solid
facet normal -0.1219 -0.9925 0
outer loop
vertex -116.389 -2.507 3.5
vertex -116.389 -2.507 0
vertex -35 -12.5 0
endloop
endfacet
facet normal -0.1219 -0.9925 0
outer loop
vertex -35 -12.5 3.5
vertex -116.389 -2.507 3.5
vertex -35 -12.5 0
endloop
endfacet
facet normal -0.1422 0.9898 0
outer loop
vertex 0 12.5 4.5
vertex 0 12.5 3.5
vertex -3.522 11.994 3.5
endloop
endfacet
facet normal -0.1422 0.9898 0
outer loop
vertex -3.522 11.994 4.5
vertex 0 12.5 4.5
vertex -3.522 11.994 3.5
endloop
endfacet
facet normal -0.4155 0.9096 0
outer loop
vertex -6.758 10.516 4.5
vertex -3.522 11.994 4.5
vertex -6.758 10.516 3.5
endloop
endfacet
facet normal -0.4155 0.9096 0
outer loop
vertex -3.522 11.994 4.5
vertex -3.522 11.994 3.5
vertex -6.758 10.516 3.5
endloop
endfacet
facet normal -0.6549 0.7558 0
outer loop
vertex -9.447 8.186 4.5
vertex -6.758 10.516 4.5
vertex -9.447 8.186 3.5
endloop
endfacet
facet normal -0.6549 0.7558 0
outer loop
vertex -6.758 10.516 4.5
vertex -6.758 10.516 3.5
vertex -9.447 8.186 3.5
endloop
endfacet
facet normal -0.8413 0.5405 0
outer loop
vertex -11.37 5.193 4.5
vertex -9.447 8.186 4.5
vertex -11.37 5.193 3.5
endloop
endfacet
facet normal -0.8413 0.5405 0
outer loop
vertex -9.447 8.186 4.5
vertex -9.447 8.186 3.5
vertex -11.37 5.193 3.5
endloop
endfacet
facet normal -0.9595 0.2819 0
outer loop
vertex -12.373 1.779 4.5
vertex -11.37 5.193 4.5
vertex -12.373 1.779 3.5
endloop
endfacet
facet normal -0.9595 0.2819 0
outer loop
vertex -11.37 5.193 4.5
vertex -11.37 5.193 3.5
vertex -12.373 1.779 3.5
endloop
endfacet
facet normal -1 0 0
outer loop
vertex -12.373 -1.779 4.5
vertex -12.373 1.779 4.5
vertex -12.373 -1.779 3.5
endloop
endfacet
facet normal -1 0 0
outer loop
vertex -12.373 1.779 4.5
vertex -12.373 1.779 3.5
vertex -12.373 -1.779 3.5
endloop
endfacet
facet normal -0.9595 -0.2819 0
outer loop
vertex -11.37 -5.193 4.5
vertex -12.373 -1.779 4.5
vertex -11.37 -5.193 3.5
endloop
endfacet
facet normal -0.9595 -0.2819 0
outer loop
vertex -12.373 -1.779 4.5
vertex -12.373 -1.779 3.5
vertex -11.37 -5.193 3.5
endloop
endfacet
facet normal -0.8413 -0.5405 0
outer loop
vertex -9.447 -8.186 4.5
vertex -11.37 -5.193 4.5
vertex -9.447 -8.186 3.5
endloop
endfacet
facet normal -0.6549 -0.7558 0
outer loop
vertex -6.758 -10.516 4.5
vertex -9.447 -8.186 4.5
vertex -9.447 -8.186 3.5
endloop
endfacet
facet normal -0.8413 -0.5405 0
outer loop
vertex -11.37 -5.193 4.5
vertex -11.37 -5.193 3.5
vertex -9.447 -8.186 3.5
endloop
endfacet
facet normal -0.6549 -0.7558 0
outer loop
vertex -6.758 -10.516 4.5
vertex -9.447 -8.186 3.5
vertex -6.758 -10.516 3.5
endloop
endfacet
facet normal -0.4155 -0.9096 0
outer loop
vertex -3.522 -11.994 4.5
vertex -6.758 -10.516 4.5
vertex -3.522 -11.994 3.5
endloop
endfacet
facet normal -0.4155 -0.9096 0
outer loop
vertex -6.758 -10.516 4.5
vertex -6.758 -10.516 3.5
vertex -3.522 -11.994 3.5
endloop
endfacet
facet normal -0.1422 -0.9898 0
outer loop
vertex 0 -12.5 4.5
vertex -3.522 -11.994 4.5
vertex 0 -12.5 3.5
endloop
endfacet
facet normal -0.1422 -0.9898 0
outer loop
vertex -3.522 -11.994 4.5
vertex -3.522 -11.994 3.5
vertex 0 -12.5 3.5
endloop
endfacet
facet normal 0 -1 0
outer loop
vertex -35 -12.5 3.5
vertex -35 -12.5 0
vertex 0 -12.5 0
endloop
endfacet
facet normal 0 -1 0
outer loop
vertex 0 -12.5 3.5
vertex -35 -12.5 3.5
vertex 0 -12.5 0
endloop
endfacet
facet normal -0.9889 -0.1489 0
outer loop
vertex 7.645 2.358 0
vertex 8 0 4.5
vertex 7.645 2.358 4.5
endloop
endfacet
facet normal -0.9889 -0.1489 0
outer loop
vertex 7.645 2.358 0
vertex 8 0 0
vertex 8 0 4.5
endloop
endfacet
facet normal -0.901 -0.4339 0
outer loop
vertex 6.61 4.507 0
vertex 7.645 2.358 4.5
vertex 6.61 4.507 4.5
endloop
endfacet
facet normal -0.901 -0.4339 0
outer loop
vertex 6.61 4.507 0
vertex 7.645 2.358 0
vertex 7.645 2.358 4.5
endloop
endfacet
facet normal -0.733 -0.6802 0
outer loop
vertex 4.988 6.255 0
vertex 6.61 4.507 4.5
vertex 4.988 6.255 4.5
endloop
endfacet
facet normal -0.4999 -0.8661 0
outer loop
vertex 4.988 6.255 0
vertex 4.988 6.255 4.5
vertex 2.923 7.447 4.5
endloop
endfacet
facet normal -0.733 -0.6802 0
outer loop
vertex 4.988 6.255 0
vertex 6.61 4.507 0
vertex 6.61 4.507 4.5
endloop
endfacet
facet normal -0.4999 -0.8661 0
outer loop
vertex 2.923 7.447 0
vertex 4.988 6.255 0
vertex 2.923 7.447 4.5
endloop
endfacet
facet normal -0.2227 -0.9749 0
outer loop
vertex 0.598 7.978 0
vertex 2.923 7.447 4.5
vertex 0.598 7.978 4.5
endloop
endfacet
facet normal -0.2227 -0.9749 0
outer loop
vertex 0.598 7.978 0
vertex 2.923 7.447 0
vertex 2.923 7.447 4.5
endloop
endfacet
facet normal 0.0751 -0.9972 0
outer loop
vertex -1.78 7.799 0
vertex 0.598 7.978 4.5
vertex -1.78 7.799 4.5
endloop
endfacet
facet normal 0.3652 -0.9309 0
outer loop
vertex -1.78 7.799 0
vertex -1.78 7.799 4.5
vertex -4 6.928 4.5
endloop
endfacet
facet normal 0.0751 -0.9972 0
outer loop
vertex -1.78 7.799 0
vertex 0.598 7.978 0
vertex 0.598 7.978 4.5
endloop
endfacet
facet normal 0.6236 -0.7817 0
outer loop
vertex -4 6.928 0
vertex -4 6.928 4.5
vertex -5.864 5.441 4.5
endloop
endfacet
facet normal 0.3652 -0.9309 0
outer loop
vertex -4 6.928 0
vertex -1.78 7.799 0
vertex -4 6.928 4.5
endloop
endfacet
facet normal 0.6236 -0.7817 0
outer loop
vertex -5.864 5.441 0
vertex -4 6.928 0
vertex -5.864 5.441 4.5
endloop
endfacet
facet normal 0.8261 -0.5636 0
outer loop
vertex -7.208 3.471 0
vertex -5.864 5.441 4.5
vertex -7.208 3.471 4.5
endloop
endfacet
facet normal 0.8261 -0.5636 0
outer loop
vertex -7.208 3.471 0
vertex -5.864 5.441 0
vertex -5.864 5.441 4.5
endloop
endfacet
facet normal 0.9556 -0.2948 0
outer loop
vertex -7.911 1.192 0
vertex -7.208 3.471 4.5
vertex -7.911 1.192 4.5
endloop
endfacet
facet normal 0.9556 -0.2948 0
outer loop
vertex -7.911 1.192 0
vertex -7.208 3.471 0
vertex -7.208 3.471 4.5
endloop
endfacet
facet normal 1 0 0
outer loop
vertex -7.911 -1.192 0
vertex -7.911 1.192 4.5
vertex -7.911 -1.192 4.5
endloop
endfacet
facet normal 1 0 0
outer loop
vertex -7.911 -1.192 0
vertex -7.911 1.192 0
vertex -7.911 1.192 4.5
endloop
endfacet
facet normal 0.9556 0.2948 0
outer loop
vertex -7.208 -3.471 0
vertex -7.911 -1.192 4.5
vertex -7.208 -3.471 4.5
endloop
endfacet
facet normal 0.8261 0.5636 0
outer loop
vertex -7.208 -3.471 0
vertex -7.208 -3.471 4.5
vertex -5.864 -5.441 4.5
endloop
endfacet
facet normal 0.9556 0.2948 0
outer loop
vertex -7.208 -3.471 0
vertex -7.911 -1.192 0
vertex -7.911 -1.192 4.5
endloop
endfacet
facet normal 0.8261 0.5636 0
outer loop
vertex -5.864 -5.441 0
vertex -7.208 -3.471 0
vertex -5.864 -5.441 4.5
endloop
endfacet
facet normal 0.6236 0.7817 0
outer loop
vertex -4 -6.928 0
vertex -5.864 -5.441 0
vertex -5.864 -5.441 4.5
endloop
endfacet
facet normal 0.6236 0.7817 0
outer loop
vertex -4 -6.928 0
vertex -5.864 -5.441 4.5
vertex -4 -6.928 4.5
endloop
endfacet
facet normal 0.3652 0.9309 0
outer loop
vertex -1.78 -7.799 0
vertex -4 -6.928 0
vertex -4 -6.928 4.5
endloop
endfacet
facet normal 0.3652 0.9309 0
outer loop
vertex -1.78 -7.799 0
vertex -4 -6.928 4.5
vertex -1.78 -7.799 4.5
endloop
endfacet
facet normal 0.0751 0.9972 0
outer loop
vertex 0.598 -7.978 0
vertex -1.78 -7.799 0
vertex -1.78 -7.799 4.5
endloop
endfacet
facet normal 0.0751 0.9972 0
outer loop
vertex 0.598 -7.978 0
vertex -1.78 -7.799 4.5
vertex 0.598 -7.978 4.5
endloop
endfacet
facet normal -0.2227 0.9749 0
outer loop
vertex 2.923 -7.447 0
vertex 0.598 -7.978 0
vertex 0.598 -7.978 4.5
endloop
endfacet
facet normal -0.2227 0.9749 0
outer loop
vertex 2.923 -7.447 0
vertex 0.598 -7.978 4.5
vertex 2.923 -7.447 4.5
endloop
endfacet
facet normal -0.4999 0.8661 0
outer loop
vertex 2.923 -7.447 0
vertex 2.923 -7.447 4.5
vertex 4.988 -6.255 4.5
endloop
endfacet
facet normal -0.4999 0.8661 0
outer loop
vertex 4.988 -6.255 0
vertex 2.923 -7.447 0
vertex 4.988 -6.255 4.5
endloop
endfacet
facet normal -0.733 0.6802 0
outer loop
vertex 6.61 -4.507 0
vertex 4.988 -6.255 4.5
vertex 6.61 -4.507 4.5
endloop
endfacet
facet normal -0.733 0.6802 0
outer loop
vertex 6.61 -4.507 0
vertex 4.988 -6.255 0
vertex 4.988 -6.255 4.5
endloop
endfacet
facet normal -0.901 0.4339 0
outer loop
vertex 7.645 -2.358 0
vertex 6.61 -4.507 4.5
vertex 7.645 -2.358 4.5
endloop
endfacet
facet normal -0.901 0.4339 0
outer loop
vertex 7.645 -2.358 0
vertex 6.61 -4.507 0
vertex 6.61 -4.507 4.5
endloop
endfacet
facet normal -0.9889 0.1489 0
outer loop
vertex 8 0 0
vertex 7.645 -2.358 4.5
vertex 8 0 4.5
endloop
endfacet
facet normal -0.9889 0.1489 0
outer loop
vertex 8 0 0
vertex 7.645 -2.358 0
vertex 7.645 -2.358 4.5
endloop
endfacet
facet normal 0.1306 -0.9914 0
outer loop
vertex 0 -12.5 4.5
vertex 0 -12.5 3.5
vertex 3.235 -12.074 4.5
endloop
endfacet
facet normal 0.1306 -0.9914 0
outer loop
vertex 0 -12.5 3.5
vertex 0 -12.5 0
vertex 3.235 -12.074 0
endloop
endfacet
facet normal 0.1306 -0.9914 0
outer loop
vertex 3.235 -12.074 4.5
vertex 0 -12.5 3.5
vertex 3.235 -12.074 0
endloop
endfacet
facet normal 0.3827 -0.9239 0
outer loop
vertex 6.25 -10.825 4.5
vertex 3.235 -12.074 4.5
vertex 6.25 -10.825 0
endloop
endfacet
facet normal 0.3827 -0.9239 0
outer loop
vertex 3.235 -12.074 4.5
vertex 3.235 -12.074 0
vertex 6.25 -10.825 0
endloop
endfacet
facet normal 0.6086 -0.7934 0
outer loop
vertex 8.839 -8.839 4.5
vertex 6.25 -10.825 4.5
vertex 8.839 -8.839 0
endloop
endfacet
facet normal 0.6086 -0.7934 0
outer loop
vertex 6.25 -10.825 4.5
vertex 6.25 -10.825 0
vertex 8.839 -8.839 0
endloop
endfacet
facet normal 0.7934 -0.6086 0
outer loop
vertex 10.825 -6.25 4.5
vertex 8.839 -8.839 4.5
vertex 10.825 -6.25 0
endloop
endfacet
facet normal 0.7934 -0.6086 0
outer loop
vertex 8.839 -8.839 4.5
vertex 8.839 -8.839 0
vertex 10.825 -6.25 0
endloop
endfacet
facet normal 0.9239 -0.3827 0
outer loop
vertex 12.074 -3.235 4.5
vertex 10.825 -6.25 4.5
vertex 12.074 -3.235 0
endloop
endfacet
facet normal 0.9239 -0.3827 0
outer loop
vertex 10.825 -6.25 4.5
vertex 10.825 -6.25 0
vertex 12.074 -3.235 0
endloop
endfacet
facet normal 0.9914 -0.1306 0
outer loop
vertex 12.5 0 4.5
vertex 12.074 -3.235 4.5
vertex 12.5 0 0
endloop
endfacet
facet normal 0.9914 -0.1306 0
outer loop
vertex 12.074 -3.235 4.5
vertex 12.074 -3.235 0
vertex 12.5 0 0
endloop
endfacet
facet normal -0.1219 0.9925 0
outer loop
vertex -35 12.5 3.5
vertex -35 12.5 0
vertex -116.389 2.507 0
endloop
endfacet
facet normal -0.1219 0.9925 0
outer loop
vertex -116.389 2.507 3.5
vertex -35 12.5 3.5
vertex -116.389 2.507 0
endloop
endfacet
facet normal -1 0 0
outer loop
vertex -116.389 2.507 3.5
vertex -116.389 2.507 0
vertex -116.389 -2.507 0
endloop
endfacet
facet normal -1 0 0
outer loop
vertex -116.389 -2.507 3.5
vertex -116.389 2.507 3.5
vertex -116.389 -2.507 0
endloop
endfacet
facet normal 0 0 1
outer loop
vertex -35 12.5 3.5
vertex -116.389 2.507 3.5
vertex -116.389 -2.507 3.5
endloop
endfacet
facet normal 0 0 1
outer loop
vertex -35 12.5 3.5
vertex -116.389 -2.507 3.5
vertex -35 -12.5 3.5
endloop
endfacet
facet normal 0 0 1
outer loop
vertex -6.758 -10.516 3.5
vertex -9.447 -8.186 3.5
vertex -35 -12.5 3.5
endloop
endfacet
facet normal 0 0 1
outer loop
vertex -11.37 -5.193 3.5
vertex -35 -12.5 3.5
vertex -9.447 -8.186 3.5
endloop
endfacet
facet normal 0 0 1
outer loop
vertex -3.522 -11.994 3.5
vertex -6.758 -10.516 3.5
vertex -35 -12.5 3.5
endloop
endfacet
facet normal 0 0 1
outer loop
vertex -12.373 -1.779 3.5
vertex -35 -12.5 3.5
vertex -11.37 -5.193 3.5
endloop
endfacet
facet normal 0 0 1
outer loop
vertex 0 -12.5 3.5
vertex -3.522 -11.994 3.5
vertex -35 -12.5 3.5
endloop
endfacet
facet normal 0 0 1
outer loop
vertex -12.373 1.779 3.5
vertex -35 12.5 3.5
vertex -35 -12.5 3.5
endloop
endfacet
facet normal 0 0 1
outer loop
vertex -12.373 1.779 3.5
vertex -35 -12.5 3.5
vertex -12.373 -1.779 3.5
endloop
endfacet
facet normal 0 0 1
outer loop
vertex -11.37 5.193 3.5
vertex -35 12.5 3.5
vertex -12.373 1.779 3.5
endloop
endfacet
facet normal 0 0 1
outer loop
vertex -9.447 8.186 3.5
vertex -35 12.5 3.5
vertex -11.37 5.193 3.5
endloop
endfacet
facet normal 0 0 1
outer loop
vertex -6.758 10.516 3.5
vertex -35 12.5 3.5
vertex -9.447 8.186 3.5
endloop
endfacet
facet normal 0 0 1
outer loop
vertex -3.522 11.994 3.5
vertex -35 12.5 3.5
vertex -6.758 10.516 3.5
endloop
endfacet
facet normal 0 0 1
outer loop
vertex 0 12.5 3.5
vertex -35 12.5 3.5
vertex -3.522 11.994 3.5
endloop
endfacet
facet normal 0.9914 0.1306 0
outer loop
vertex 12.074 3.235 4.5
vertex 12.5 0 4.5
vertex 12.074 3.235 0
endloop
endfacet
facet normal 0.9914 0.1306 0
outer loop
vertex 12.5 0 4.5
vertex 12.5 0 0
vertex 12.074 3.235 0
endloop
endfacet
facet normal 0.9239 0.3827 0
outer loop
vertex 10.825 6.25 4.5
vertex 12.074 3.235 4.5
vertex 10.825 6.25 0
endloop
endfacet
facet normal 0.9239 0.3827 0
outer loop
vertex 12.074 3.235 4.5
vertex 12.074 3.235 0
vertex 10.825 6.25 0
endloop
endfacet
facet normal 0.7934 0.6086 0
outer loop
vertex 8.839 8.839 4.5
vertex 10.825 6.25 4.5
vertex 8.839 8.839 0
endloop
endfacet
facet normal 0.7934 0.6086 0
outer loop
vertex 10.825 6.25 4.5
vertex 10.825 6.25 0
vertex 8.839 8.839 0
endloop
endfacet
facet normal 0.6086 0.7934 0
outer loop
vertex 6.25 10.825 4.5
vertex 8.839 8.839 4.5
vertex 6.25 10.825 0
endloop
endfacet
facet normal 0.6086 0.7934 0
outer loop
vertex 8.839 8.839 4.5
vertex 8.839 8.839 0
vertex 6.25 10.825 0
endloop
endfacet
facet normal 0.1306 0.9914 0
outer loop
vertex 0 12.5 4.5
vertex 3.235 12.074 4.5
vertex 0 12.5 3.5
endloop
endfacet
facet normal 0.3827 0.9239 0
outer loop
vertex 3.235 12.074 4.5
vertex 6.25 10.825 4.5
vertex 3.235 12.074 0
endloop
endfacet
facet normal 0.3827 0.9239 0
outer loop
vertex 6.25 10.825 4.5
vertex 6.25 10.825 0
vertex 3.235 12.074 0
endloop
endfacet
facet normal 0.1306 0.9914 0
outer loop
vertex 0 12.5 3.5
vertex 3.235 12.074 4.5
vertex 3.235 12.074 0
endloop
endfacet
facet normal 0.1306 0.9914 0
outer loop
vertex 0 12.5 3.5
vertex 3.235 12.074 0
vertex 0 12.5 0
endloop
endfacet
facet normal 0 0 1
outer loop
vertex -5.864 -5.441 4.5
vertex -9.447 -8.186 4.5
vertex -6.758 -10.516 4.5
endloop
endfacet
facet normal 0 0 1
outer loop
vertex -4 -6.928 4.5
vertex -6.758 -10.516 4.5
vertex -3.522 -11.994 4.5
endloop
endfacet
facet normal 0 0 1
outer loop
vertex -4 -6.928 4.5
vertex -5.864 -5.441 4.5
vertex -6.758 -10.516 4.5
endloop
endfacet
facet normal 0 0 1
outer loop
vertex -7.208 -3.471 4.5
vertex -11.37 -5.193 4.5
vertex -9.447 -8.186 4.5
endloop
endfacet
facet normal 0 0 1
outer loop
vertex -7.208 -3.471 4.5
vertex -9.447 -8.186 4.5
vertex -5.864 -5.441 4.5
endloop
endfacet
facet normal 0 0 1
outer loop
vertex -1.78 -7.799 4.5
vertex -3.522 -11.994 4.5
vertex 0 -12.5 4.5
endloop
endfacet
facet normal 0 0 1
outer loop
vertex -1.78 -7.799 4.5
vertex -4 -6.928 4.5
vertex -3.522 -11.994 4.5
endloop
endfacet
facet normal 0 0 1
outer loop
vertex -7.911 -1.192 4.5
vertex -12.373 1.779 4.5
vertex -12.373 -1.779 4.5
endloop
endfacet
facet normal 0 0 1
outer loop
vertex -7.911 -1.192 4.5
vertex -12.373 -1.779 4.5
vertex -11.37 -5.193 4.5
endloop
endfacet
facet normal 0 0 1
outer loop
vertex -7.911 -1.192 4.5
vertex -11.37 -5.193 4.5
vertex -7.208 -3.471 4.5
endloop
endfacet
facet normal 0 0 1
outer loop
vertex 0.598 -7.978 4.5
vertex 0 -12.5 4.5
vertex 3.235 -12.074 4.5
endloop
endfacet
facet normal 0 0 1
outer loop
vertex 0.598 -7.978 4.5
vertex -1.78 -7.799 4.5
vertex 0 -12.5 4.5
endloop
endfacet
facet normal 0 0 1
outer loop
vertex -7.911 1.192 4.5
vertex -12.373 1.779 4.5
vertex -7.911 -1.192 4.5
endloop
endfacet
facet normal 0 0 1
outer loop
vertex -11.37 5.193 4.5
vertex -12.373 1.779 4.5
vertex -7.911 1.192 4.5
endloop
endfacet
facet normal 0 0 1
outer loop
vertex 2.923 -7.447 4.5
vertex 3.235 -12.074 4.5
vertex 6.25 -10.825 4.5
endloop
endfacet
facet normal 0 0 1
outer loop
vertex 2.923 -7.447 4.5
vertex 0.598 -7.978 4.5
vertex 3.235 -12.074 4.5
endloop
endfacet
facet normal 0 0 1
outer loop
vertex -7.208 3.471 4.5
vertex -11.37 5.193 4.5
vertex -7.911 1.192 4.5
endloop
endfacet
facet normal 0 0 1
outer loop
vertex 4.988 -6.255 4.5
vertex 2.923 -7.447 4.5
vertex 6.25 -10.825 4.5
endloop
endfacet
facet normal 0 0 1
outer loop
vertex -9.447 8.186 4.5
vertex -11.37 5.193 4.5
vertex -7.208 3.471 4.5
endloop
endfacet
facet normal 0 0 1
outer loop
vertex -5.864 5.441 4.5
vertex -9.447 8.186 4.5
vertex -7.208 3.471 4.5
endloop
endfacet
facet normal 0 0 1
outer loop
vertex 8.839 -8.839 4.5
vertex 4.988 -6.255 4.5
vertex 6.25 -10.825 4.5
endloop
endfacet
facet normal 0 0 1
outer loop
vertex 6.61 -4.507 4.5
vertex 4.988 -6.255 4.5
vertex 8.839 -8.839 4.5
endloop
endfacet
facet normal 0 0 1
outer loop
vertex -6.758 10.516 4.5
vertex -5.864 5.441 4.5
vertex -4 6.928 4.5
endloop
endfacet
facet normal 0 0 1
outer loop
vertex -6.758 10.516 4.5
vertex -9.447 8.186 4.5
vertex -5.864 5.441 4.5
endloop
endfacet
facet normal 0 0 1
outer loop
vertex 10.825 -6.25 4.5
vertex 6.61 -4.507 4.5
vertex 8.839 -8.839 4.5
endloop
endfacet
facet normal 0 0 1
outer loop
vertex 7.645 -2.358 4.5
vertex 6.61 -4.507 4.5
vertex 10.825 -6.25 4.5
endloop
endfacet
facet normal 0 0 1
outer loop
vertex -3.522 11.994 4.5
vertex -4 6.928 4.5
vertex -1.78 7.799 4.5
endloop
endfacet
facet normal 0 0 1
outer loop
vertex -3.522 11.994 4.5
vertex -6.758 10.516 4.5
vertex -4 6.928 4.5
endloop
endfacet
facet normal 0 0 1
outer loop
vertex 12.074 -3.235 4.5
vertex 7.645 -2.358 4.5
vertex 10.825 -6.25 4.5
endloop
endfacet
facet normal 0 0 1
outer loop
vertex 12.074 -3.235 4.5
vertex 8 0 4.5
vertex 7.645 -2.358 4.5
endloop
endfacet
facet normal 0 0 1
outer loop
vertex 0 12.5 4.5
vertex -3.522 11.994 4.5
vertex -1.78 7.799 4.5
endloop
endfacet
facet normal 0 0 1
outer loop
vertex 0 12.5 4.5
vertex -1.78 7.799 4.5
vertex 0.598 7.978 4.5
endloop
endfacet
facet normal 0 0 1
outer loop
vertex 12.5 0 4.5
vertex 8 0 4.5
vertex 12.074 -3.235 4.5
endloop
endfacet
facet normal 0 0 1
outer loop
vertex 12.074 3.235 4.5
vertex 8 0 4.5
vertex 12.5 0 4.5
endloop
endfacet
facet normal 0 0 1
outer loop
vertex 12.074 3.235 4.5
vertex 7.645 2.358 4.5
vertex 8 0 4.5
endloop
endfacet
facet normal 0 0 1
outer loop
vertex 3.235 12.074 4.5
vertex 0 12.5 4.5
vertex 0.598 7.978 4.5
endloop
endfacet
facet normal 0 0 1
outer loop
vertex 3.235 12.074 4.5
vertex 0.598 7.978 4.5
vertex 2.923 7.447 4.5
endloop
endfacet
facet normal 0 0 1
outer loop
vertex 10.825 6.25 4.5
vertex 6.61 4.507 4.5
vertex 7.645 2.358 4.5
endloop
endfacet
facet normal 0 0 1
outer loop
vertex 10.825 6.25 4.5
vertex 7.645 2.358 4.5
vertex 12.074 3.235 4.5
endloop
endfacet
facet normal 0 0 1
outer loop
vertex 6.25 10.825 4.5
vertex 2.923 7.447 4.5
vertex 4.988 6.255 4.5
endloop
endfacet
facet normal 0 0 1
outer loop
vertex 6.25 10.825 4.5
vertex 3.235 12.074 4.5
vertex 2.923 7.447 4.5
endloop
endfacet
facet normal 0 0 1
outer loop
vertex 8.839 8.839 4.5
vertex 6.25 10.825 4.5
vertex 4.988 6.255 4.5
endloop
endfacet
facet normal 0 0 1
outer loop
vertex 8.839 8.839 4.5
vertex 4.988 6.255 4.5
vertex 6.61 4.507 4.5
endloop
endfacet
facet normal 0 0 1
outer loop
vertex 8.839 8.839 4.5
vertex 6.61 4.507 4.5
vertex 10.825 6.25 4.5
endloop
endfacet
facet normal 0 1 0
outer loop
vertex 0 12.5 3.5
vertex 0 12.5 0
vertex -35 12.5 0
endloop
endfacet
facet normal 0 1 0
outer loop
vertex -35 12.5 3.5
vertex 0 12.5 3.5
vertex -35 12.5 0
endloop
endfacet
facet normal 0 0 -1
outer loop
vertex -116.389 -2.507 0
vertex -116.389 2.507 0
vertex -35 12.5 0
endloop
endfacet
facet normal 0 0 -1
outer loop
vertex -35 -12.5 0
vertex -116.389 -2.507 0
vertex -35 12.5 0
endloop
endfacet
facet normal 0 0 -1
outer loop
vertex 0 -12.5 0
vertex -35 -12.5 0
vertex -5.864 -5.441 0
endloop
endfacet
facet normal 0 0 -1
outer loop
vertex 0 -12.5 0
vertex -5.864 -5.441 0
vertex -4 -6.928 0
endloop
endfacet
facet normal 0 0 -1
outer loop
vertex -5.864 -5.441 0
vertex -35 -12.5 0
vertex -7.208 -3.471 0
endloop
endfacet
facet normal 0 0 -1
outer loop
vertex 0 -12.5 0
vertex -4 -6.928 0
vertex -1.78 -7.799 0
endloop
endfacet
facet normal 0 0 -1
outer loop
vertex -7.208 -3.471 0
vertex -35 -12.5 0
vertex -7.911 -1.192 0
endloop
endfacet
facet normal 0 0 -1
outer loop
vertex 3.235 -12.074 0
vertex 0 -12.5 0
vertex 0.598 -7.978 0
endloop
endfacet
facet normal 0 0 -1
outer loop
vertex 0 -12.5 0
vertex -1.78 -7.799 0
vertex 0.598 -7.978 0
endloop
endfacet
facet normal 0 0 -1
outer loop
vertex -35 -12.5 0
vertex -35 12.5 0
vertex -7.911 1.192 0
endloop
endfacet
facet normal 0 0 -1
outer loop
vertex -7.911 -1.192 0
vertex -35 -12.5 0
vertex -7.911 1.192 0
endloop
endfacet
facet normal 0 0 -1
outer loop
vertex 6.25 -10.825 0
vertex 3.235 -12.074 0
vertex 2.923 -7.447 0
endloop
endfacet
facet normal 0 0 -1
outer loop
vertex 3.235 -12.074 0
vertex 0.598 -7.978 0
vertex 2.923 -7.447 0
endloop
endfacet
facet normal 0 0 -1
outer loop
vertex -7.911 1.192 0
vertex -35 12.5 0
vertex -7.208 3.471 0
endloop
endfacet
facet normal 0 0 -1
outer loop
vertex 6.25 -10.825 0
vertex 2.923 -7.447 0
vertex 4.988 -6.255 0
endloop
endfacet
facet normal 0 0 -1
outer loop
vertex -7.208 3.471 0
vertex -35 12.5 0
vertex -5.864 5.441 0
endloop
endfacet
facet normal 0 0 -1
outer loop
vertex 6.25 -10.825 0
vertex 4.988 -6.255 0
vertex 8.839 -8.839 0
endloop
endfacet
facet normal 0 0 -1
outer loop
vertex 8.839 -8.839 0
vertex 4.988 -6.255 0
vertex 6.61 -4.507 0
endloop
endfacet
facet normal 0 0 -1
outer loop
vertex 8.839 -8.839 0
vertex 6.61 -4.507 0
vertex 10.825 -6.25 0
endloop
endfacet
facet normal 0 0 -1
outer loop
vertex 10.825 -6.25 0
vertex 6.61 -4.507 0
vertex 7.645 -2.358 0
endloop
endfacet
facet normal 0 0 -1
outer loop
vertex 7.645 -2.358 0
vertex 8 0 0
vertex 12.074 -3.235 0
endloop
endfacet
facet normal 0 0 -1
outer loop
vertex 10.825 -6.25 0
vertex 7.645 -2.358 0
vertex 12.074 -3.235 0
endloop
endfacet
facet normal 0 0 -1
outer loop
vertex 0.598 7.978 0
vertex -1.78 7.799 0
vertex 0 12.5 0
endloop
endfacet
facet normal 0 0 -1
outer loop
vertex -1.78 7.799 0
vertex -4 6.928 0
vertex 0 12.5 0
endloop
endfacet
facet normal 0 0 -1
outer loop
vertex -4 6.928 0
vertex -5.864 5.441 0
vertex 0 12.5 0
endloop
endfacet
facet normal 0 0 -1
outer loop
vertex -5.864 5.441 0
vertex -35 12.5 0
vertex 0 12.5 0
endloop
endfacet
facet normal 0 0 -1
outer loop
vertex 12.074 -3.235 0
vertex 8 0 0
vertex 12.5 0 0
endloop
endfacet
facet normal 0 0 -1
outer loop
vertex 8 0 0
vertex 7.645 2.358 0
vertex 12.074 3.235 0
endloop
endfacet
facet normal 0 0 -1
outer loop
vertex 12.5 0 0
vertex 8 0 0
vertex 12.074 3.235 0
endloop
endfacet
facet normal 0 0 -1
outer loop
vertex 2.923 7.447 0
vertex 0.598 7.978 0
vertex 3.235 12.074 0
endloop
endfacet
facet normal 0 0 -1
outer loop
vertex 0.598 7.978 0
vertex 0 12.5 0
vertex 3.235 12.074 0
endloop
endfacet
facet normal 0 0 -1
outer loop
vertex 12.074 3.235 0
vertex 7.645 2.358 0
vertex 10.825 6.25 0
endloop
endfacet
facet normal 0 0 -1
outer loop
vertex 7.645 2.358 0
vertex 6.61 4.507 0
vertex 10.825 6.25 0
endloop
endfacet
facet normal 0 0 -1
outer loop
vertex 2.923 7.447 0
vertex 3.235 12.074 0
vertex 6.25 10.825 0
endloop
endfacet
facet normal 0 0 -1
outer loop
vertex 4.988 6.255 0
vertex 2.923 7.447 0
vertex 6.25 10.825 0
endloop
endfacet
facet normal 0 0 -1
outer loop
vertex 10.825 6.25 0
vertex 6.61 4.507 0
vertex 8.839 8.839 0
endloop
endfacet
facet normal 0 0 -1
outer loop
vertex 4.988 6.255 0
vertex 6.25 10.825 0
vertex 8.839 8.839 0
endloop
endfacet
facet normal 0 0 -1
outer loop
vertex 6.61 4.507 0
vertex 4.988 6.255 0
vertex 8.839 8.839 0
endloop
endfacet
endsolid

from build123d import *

# Parameters (mm, degrees)
F0_R     = 8
F1_DEPTH = 3.5
F2_R     = 8
F3_DEPTH = 1


with BuildPart() as f1:
    # F0 (on Top) → F1 (new body)
    with BuildSketch(Plane.XY):
        with BuildLine():
            ThreePointArc((0, -12.5), (8.838835, -8.838835), (12.5, 0))
            ThreePointArc((12.5, 0), (8.838835, 8.838835), (0, 12.5))
            ThreePointArc((0, 12.5), (-12.5, 0), (0, -12.5))
        make_face()
        Circle(F0_R, mode=Mode.SUBTRACT)
        with BuildLine():
            ThreePointArc((0, -12.5), (-12.5, 0), (0, 12.5))
            Line((0, 12.5), (-35, 12.5))
            Line((-35, 12.5), (-116.388784, 2.506714))
            Line((-116.388784, 2.506714), (-116.388784, -2.506714))
            Line((-116.388784, -2.506714), (-35, -12.5))
            Line((-35, -12.5), (0, -12.5))
        make_face()
    extrude(amount=F1_DEPTH)

    # F2 (on face) → F3 (join)
    with BuildSketch(Plane.XY.offset(3.5)):
        with BuildLine():
            ThreePointArc((0, -12.5), (8.838835, -8.838835), (12.5, 0))
            ThreePointArc((12.5, 0), (8.838835, 8.838835), (0, 12.5))
            ThreePointArc((0, 12.5), (-12.5, 0), (0, -12.5))
        make_face()
        Circle(F2_R, mode=Mode.SUBTRACT)
    extrude(amount=F3_DEPTH)


solid = f1.part
